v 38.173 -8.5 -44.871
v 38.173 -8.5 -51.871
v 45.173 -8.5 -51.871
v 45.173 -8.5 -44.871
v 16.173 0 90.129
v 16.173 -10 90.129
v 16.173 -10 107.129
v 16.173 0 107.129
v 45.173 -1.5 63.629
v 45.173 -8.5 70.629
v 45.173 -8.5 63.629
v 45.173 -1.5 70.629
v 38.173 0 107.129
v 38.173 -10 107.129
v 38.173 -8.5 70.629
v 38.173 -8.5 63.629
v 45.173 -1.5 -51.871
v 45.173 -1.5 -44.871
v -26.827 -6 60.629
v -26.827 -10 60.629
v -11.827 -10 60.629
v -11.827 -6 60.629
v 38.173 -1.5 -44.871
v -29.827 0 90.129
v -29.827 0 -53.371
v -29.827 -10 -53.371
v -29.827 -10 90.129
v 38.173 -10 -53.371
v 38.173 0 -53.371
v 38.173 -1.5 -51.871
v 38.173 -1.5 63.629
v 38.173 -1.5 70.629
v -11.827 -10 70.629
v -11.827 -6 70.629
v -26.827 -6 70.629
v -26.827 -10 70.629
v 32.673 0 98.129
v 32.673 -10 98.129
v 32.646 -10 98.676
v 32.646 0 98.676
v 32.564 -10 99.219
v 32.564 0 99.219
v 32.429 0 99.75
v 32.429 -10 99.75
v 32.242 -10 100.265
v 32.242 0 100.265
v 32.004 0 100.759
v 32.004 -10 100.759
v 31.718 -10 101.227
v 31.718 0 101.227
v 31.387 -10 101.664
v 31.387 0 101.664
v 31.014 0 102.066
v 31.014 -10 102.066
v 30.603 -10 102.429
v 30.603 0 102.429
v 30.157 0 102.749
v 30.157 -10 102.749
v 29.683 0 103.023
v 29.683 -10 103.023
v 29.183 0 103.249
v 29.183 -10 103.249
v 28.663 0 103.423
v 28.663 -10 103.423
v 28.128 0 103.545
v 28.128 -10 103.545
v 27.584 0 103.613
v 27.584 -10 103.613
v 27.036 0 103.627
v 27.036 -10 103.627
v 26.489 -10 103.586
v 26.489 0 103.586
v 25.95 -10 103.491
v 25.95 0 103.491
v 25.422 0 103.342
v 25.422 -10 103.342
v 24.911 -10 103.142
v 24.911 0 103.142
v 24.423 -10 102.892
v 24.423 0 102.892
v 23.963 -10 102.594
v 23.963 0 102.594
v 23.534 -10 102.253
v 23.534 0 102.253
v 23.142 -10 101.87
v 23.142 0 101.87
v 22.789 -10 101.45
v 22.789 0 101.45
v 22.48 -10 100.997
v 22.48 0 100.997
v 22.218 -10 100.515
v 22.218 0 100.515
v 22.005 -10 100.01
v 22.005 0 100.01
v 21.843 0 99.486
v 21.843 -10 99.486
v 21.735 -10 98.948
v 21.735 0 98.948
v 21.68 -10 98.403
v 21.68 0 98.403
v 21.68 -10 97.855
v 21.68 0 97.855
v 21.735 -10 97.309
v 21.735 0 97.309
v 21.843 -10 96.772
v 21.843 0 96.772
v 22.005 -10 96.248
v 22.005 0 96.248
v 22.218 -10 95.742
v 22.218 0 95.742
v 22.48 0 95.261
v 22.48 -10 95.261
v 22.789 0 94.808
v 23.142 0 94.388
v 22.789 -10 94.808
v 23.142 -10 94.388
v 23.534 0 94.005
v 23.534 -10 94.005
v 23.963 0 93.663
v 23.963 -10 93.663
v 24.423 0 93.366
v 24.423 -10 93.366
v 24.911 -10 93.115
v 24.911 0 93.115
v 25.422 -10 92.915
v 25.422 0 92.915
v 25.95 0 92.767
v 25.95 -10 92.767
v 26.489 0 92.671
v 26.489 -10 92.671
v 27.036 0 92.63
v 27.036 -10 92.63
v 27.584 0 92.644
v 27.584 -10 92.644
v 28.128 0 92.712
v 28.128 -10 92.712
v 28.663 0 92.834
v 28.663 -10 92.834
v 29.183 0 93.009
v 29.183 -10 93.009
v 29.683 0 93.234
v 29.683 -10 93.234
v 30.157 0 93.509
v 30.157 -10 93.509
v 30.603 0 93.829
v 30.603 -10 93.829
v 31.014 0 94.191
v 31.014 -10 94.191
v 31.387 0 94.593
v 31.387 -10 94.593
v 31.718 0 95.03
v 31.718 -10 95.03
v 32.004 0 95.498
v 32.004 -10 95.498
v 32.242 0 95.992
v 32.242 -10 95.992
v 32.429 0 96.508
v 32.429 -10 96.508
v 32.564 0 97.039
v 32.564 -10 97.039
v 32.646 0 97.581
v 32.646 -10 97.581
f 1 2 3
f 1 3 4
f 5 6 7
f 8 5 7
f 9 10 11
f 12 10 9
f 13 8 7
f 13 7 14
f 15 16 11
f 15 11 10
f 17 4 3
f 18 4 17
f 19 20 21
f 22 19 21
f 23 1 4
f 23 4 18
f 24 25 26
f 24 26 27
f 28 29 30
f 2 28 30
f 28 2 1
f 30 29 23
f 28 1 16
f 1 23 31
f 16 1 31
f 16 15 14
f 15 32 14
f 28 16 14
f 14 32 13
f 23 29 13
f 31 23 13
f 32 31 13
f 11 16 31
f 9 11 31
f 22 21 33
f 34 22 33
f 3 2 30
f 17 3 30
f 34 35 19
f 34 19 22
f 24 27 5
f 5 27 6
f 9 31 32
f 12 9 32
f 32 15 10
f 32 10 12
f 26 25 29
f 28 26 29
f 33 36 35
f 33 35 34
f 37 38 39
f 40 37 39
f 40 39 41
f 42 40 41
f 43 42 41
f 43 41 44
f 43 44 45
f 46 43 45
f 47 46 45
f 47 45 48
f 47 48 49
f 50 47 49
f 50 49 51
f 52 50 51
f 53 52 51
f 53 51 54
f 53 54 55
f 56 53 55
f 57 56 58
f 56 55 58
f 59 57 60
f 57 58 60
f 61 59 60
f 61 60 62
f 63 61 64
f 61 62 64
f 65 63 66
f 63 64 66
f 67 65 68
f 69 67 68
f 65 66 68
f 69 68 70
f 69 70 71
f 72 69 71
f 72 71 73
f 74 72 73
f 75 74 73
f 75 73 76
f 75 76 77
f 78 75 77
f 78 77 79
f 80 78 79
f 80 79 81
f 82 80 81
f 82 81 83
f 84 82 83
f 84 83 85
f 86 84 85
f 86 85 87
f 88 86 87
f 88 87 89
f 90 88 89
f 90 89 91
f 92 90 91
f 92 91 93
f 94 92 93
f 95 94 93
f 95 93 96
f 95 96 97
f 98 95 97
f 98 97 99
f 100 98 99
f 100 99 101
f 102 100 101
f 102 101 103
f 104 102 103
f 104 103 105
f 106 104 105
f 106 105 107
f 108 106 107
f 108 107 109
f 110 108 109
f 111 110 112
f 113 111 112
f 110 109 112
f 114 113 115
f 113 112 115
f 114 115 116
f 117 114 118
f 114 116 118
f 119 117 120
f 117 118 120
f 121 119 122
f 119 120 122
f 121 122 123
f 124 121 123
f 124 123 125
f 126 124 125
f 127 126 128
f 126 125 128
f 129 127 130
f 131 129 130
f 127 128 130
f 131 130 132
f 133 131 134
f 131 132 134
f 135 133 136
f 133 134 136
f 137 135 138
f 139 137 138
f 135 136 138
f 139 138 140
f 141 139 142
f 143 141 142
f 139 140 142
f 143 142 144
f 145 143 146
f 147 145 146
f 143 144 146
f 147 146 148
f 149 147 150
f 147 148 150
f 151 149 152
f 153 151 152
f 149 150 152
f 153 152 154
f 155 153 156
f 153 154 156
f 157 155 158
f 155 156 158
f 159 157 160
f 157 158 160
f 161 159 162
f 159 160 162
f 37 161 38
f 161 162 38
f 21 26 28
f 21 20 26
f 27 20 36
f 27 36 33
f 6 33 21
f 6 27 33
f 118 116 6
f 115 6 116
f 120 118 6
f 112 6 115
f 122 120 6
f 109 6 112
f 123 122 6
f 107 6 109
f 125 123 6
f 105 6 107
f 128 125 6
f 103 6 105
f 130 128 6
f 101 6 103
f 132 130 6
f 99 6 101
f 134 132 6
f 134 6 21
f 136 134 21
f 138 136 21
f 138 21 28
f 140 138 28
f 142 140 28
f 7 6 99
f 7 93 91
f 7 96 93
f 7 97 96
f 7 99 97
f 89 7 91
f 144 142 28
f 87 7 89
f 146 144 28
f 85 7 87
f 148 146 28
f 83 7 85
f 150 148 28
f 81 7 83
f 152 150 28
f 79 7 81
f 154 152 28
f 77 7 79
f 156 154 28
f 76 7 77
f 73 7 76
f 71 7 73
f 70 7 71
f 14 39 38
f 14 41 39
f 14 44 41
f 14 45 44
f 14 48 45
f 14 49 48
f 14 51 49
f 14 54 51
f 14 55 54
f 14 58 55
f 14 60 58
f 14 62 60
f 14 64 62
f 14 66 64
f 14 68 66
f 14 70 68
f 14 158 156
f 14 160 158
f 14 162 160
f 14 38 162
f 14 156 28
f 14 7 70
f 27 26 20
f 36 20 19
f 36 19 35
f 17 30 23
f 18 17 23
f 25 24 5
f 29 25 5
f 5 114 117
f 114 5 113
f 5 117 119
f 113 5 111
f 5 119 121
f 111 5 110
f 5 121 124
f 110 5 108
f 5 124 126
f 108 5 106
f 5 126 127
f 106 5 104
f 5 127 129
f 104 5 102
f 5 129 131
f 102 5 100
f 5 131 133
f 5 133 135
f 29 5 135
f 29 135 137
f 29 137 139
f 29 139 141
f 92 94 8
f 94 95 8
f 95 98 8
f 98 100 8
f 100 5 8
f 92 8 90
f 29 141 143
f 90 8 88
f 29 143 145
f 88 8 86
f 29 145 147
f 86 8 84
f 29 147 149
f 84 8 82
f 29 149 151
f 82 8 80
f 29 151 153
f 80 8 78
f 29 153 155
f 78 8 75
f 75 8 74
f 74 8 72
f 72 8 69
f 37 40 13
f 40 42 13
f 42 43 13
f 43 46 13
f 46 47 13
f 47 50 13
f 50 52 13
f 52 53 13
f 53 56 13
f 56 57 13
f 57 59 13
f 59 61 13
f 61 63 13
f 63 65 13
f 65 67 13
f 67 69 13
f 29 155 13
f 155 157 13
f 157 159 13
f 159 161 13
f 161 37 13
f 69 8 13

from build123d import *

# Parameters (mm, degrees)
F0_W     = 68
F0_H     = 160.5
F1_DEPTH = 10
F2_W     = 46
F2_H     = 17
F3_DEPTH = 25
F4_R     = 5.5
F5_DEPTH = 25
F6_W     = 15
F6_H     = 10
F7_DEPTH = 4
F8_W     = 7
F8_H     = 7
F9_DEPTH = 7


with BuildPart() as f1:
    # F0 (on Front) → F1 (new body)
    with BuildSketch(Plane.XZ):
        with Locations((4.173387, 26.878738)):
            Rectangle(F0_W, F0_H)
    extrude(amount=F1_DEPTH)

    # F2 (on face) → F3 (cut)
    with BuildSketch(Plane.XZ.offset(10)):
        with Locations((-6.826613, 98.628738)):
            Rectangle(F2_W, F2_H)
    extrude(amount=-F3_DEPTH, mode=Mode.SUBTRACT)

    # F4 (on face) → F5 (cut)
    with BuildSketch(Plane.XZ.offset(10)):
        with Locations((27.173387, 98.128738)):
            Circle(F4_R)
    extrude(amount=-F5_DEPTH, mode=Mode.SUBTRACT)

    # F6 (on face) → F7 (cut)
    with BuildSketch(Plane.XZ.offset(10)):
        with Locations((-19.326613, 65.628738)):
            Rectangle(F6_W, F6_H)
    extrude(amount=-F7_DEPTH, mode=Mode.SUBTRACT)

    # F8 (on face) → F9 (join)
    with BuildSketch(Plane.YZ.offset(38.173387)):
        with Locations((-5, -48.371262)):
            Rectangle(F8_W, F8_H)
        with Locations((-5, 67.128738)):
            Rectangle(F8_W, F8_H)
    extrude(amount=F9_DEPTH)


solid = f1.part
